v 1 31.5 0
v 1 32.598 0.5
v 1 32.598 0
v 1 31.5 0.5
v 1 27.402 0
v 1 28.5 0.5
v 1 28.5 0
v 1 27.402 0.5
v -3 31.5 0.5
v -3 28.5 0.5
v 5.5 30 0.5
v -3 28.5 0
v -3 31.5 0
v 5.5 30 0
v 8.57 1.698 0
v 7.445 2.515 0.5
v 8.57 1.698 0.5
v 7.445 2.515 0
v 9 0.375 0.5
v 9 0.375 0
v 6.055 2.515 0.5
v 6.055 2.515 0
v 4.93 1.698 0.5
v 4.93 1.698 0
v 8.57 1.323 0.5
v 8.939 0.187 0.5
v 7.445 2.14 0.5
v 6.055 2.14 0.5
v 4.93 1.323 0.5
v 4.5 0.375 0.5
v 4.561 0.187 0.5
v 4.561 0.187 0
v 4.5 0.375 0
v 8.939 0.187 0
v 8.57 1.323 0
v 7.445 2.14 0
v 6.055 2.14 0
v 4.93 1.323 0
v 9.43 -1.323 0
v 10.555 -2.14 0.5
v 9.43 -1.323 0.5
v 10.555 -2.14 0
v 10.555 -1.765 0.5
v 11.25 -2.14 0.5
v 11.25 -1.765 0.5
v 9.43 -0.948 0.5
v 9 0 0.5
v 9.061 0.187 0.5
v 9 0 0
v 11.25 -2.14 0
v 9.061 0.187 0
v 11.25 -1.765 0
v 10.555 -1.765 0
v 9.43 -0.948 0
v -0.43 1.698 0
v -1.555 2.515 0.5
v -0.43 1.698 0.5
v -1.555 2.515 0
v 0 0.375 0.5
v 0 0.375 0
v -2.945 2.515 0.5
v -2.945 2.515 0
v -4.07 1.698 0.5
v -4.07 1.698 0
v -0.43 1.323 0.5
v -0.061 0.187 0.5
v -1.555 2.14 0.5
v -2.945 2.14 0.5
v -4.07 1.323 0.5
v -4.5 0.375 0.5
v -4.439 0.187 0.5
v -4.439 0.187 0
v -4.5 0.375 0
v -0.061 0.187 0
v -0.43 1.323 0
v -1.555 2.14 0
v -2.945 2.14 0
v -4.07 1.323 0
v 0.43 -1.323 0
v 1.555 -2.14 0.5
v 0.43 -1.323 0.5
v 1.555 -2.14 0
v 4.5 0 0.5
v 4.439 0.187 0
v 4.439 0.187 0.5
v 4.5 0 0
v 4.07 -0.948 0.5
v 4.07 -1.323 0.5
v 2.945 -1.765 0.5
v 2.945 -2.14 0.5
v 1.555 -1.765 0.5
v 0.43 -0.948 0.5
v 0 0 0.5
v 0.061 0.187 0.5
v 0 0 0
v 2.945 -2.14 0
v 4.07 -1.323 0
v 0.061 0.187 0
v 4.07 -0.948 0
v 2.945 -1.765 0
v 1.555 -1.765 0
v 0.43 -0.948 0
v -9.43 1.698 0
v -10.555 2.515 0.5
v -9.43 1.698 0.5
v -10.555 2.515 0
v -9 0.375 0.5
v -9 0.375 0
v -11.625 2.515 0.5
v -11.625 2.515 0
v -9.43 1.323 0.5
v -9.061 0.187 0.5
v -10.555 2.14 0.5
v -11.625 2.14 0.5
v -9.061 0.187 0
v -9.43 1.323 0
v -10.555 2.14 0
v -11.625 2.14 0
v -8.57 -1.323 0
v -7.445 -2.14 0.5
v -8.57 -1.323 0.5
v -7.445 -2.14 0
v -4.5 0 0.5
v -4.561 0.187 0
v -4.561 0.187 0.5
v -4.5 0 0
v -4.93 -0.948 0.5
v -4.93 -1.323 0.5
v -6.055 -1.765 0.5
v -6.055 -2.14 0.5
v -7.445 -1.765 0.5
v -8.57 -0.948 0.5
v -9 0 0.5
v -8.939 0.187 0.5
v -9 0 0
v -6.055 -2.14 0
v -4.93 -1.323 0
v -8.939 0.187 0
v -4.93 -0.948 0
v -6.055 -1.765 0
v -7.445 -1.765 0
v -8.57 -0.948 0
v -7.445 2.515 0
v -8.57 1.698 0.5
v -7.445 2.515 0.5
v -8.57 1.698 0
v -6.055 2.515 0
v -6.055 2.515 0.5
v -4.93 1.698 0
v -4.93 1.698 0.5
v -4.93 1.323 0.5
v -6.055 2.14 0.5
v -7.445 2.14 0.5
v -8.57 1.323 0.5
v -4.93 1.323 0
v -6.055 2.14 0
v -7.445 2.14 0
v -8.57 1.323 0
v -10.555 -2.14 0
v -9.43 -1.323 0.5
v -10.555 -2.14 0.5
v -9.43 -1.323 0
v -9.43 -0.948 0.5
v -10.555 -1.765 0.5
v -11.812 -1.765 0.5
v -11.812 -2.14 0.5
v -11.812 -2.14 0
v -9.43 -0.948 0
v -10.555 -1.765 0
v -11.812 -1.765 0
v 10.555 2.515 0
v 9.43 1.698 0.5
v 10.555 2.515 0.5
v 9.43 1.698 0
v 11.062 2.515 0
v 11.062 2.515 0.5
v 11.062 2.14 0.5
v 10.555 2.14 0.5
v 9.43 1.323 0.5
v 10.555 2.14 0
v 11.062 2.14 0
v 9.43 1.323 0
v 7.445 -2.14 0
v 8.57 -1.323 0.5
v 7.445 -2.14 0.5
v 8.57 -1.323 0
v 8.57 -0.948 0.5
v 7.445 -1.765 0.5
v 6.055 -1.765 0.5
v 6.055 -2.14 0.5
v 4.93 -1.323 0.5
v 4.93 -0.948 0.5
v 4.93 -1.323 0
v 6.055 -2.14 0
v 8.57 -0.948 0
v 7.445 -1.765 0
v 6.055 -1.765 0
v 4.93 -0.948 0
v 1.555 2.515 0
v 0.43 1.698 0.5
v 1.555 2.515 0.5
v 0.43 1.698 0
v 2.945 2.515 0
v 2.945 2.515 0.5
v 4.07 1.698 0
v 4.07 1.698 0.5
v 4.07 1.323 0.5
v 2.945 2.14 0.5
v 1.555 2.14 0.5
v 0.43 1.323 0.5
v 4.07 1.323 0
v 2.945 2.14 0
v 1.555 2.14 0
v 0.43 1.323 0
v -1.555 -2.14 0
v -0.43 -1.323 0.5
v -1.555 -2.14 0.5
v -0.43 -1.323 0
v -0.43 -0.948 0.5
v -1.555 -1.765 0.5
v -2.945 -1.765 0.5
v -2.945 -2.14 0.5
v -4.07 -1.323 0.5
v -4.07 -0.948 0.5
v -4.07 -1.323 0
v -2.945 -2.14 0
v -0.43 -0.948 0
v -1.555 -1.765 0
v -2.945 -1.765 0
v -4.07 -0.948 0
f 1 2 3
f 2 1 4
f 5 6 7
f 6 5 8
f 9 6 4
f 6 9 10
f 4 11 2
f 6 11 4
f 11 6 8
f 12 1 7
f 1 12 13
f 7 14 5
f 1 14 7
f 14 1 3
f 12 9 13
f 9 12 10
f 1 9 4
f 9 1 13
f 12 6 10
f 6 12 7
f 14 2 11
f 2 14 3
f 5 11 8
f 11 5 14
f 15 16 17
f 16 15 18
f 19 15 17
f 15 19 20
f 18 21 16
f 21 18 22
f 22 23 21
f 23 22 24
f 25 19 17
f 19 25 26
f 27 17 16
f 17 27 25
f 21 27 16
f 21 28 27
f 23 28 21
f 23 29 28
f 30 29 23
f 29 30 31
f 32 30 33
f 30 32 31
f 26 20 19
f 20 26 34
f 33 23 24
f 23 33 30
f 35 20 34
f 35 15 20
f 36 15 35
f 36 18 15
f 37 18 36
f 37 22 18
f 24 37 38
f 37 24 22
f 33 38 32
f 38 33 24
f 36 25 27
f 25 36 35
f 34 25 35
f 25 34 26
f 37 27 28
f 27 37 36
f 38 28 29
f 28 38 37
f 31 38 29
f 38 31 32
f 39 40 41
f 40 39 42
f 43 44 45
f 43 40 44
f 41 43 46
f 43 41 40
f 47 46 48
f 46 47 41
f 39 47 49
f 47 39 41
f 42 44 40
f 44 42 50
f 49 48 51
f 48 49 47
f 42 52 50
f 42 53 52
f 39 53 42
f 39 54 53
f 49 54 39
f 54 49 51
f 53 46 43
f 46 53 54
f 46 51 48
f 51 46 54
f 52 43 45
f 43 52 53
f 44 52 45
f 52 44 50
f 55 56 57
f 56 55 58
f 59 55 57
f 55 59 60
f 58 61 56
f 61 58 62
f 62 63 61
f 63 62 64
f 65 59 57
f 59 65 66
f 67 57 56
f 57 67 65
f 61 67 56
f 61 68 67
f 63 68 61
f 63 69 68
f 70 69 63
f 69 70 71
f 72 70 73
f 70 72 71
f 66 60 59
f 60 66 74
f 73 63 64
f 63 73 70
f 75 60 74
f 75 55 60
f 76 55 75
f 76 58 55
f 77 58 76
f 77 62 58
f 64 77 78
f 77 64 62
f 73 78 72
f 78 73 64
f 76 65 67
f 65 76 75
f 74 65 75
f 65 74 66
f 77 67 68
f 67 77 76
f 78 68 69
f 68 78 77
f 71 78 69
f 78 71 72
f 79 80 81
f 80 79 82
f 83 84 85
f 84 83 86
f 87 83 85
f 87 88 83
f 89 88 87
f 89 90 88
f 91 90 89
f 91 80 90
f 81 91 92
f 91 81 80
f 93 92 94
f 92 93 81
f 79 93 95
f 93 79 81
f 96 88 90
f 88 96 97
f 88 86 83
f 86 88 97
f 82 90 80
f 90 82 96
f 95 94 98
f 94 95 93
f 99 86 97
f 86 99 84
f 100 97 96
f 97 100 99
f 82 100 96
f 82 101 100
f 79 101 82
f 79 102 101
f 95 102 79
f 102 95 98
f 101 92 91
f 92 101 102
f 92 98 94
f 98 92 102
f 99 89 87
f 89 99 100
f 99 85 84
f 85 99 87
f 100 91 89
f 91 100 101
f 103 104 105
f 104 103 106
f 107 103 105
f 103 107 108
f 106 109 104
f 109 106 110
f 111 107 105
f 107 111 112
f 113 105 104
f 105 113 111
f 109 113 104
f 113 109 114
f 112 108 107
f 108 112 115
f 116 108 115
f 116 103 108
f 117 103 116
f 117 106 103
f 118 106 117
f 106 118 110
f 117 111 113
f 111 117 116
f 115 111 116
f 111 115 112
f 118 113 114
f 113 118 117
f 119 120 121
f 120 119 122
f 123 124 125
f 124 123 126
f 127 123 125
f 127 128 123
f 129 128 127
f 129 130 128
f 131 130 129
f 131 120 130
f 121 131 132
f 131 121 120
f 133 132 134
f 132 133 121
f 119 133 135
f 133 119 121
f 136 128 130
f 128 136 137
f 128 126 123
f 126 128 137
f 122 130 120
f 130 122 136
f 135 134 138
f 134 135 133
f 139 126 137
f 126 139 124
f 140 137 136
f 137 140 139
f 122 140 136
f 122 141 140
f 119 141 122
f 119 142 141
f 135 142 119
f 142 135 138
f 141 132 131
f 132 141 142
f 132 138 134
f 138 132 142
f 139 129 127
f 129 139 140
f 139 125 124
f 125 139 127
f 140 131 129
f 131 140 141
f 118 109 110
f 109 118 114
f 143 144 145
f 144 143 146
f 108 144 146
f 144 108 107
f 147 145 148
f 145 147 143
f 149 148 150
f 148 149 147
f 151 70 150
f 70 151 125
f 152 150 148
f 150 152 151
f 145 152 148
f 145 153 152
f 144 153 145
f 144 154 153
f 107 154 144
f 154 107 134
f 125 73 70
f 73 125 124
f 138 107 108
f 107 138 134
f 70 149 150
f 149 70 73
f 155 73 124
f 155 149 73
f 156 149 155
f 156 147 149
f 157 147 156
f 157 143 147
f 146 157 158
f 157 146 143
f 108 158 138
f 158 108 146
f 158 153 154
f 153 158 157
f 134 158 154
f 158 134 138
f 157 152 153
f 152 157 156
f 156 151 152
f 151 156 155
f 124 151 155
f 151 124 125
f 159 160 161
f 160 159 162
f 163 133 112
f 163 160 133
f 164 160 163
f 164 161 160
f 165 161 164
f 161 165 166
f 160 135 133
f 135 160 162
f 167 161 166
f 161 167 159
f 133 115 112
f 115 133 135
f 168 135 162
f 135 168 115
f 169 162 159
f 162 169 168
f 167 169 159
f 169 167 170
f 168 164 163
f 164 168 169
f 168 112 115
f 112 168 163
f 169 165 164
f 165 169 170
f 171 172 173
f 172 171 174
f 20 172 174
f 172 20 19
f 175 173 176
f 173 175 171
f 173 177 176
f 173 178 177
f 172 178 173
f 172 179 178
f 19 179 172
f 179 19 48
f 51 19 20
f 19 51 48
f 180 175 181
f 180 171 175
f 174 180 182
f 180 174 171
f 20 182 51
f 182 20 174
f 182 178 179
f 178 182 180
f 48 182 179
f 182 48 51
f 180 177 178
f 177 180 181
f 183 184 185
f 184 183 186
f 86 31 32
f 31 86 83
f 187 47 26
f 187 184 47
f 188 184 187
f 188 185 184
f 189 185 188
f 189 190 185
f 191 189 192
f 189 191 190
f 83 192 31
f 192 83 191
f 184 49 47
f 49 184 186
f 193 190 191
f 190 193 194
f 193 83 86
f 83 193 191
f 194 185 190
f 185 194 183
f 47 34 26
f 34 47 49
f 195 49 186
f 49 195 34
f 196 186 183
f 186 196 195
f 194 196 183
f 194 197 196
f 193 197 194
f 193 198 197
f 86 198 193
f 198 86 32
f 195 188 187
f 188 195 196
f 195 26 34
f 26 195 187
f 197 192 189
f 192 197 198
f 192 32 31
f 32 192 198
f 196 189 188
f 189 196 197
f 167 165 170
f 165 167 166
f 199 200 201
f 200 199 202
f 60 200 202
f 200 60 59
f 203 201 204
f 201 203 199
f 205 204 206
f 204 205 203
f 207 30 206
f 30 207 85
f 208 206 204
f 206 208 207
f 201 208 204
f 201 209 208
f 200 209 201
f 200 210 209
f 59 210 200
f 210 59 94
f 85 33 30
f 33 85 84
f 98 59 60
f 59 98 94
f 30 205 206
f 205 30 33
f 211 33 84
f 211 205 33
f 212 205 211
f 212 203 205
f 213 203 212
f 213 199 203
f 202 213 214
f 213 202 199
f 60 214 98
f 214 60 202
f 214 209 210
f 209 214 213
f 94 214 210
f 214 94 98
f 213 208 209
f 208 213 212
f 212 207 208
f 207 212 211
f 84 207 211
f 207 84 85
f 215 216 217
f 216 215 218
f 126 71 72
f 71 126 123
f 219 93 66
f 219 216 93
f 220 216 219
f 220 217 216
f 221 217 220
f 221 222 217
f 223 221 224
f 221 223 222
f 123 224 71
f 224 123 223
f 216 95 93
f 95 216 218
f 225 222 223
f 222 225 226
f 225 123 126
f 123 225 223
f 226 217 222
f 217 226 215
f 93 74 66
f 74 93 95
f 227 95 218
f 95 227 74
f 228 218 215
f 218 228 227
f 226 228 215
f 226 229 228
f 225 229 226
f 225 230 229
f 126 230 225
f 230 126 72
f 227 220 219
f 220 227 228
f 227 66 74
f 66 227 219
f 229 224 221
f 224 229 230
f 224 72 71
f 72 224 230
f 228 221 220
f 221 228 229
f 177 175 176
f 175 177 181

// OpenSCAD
// file: common.scad
module arrow() {
    union() {
        translate([-3,-1.5,0]) cube([4,3,0.5]);
        translate([2.5,0,0]) cylinder(0.5,3,3,$fn=3);
    }
}

module _wave_s() {
    difference() {
        translate([0,2.5,0]) cylinder(0.5,3,3);
        translate([0,2,-10]) cylinder(30,3,3);
    }
    translate([6,0,0]) difference() {
        translate([0,2,0]) cylinder(0.5,3,3);
        translate([0,2.5,-10]) cylinder(30,3,3);
    }
}

module wave() {
    $wave_scale = 0.75;
    scale([$wave_scale, $wave_scale, 1]) translate([0,-2,0]) {
        difference() {
            translate([9,0,0]) _wave_s();
            translate([15,-3,-1]) cube([6,10,2.5]);
        }
        translate([-3,0,0]) _wave_s();
        difference() {
            translate([-15,0,0]) _wave_s();
            translate([-21.5,-3,-1]) cube([6,10,2.5]);
        }
        
        mirror([-1,0,0]) {
            difference() {
                translate([9,0,0]) _wave_s();
                translate([15.75,-3,-1]) cube([6,10,2.5]);
            }
            translate([-3,0,0]) _wave_s();
            difference() {
                translate([-15,0,0]) _wave_s();
                translate([-20.75,-3,-1]) cube([6,10,2.5]);
            }
        }
    }
}
// main file
include <common.scad>;

translate([0,30,0]) arrow();
wave();
